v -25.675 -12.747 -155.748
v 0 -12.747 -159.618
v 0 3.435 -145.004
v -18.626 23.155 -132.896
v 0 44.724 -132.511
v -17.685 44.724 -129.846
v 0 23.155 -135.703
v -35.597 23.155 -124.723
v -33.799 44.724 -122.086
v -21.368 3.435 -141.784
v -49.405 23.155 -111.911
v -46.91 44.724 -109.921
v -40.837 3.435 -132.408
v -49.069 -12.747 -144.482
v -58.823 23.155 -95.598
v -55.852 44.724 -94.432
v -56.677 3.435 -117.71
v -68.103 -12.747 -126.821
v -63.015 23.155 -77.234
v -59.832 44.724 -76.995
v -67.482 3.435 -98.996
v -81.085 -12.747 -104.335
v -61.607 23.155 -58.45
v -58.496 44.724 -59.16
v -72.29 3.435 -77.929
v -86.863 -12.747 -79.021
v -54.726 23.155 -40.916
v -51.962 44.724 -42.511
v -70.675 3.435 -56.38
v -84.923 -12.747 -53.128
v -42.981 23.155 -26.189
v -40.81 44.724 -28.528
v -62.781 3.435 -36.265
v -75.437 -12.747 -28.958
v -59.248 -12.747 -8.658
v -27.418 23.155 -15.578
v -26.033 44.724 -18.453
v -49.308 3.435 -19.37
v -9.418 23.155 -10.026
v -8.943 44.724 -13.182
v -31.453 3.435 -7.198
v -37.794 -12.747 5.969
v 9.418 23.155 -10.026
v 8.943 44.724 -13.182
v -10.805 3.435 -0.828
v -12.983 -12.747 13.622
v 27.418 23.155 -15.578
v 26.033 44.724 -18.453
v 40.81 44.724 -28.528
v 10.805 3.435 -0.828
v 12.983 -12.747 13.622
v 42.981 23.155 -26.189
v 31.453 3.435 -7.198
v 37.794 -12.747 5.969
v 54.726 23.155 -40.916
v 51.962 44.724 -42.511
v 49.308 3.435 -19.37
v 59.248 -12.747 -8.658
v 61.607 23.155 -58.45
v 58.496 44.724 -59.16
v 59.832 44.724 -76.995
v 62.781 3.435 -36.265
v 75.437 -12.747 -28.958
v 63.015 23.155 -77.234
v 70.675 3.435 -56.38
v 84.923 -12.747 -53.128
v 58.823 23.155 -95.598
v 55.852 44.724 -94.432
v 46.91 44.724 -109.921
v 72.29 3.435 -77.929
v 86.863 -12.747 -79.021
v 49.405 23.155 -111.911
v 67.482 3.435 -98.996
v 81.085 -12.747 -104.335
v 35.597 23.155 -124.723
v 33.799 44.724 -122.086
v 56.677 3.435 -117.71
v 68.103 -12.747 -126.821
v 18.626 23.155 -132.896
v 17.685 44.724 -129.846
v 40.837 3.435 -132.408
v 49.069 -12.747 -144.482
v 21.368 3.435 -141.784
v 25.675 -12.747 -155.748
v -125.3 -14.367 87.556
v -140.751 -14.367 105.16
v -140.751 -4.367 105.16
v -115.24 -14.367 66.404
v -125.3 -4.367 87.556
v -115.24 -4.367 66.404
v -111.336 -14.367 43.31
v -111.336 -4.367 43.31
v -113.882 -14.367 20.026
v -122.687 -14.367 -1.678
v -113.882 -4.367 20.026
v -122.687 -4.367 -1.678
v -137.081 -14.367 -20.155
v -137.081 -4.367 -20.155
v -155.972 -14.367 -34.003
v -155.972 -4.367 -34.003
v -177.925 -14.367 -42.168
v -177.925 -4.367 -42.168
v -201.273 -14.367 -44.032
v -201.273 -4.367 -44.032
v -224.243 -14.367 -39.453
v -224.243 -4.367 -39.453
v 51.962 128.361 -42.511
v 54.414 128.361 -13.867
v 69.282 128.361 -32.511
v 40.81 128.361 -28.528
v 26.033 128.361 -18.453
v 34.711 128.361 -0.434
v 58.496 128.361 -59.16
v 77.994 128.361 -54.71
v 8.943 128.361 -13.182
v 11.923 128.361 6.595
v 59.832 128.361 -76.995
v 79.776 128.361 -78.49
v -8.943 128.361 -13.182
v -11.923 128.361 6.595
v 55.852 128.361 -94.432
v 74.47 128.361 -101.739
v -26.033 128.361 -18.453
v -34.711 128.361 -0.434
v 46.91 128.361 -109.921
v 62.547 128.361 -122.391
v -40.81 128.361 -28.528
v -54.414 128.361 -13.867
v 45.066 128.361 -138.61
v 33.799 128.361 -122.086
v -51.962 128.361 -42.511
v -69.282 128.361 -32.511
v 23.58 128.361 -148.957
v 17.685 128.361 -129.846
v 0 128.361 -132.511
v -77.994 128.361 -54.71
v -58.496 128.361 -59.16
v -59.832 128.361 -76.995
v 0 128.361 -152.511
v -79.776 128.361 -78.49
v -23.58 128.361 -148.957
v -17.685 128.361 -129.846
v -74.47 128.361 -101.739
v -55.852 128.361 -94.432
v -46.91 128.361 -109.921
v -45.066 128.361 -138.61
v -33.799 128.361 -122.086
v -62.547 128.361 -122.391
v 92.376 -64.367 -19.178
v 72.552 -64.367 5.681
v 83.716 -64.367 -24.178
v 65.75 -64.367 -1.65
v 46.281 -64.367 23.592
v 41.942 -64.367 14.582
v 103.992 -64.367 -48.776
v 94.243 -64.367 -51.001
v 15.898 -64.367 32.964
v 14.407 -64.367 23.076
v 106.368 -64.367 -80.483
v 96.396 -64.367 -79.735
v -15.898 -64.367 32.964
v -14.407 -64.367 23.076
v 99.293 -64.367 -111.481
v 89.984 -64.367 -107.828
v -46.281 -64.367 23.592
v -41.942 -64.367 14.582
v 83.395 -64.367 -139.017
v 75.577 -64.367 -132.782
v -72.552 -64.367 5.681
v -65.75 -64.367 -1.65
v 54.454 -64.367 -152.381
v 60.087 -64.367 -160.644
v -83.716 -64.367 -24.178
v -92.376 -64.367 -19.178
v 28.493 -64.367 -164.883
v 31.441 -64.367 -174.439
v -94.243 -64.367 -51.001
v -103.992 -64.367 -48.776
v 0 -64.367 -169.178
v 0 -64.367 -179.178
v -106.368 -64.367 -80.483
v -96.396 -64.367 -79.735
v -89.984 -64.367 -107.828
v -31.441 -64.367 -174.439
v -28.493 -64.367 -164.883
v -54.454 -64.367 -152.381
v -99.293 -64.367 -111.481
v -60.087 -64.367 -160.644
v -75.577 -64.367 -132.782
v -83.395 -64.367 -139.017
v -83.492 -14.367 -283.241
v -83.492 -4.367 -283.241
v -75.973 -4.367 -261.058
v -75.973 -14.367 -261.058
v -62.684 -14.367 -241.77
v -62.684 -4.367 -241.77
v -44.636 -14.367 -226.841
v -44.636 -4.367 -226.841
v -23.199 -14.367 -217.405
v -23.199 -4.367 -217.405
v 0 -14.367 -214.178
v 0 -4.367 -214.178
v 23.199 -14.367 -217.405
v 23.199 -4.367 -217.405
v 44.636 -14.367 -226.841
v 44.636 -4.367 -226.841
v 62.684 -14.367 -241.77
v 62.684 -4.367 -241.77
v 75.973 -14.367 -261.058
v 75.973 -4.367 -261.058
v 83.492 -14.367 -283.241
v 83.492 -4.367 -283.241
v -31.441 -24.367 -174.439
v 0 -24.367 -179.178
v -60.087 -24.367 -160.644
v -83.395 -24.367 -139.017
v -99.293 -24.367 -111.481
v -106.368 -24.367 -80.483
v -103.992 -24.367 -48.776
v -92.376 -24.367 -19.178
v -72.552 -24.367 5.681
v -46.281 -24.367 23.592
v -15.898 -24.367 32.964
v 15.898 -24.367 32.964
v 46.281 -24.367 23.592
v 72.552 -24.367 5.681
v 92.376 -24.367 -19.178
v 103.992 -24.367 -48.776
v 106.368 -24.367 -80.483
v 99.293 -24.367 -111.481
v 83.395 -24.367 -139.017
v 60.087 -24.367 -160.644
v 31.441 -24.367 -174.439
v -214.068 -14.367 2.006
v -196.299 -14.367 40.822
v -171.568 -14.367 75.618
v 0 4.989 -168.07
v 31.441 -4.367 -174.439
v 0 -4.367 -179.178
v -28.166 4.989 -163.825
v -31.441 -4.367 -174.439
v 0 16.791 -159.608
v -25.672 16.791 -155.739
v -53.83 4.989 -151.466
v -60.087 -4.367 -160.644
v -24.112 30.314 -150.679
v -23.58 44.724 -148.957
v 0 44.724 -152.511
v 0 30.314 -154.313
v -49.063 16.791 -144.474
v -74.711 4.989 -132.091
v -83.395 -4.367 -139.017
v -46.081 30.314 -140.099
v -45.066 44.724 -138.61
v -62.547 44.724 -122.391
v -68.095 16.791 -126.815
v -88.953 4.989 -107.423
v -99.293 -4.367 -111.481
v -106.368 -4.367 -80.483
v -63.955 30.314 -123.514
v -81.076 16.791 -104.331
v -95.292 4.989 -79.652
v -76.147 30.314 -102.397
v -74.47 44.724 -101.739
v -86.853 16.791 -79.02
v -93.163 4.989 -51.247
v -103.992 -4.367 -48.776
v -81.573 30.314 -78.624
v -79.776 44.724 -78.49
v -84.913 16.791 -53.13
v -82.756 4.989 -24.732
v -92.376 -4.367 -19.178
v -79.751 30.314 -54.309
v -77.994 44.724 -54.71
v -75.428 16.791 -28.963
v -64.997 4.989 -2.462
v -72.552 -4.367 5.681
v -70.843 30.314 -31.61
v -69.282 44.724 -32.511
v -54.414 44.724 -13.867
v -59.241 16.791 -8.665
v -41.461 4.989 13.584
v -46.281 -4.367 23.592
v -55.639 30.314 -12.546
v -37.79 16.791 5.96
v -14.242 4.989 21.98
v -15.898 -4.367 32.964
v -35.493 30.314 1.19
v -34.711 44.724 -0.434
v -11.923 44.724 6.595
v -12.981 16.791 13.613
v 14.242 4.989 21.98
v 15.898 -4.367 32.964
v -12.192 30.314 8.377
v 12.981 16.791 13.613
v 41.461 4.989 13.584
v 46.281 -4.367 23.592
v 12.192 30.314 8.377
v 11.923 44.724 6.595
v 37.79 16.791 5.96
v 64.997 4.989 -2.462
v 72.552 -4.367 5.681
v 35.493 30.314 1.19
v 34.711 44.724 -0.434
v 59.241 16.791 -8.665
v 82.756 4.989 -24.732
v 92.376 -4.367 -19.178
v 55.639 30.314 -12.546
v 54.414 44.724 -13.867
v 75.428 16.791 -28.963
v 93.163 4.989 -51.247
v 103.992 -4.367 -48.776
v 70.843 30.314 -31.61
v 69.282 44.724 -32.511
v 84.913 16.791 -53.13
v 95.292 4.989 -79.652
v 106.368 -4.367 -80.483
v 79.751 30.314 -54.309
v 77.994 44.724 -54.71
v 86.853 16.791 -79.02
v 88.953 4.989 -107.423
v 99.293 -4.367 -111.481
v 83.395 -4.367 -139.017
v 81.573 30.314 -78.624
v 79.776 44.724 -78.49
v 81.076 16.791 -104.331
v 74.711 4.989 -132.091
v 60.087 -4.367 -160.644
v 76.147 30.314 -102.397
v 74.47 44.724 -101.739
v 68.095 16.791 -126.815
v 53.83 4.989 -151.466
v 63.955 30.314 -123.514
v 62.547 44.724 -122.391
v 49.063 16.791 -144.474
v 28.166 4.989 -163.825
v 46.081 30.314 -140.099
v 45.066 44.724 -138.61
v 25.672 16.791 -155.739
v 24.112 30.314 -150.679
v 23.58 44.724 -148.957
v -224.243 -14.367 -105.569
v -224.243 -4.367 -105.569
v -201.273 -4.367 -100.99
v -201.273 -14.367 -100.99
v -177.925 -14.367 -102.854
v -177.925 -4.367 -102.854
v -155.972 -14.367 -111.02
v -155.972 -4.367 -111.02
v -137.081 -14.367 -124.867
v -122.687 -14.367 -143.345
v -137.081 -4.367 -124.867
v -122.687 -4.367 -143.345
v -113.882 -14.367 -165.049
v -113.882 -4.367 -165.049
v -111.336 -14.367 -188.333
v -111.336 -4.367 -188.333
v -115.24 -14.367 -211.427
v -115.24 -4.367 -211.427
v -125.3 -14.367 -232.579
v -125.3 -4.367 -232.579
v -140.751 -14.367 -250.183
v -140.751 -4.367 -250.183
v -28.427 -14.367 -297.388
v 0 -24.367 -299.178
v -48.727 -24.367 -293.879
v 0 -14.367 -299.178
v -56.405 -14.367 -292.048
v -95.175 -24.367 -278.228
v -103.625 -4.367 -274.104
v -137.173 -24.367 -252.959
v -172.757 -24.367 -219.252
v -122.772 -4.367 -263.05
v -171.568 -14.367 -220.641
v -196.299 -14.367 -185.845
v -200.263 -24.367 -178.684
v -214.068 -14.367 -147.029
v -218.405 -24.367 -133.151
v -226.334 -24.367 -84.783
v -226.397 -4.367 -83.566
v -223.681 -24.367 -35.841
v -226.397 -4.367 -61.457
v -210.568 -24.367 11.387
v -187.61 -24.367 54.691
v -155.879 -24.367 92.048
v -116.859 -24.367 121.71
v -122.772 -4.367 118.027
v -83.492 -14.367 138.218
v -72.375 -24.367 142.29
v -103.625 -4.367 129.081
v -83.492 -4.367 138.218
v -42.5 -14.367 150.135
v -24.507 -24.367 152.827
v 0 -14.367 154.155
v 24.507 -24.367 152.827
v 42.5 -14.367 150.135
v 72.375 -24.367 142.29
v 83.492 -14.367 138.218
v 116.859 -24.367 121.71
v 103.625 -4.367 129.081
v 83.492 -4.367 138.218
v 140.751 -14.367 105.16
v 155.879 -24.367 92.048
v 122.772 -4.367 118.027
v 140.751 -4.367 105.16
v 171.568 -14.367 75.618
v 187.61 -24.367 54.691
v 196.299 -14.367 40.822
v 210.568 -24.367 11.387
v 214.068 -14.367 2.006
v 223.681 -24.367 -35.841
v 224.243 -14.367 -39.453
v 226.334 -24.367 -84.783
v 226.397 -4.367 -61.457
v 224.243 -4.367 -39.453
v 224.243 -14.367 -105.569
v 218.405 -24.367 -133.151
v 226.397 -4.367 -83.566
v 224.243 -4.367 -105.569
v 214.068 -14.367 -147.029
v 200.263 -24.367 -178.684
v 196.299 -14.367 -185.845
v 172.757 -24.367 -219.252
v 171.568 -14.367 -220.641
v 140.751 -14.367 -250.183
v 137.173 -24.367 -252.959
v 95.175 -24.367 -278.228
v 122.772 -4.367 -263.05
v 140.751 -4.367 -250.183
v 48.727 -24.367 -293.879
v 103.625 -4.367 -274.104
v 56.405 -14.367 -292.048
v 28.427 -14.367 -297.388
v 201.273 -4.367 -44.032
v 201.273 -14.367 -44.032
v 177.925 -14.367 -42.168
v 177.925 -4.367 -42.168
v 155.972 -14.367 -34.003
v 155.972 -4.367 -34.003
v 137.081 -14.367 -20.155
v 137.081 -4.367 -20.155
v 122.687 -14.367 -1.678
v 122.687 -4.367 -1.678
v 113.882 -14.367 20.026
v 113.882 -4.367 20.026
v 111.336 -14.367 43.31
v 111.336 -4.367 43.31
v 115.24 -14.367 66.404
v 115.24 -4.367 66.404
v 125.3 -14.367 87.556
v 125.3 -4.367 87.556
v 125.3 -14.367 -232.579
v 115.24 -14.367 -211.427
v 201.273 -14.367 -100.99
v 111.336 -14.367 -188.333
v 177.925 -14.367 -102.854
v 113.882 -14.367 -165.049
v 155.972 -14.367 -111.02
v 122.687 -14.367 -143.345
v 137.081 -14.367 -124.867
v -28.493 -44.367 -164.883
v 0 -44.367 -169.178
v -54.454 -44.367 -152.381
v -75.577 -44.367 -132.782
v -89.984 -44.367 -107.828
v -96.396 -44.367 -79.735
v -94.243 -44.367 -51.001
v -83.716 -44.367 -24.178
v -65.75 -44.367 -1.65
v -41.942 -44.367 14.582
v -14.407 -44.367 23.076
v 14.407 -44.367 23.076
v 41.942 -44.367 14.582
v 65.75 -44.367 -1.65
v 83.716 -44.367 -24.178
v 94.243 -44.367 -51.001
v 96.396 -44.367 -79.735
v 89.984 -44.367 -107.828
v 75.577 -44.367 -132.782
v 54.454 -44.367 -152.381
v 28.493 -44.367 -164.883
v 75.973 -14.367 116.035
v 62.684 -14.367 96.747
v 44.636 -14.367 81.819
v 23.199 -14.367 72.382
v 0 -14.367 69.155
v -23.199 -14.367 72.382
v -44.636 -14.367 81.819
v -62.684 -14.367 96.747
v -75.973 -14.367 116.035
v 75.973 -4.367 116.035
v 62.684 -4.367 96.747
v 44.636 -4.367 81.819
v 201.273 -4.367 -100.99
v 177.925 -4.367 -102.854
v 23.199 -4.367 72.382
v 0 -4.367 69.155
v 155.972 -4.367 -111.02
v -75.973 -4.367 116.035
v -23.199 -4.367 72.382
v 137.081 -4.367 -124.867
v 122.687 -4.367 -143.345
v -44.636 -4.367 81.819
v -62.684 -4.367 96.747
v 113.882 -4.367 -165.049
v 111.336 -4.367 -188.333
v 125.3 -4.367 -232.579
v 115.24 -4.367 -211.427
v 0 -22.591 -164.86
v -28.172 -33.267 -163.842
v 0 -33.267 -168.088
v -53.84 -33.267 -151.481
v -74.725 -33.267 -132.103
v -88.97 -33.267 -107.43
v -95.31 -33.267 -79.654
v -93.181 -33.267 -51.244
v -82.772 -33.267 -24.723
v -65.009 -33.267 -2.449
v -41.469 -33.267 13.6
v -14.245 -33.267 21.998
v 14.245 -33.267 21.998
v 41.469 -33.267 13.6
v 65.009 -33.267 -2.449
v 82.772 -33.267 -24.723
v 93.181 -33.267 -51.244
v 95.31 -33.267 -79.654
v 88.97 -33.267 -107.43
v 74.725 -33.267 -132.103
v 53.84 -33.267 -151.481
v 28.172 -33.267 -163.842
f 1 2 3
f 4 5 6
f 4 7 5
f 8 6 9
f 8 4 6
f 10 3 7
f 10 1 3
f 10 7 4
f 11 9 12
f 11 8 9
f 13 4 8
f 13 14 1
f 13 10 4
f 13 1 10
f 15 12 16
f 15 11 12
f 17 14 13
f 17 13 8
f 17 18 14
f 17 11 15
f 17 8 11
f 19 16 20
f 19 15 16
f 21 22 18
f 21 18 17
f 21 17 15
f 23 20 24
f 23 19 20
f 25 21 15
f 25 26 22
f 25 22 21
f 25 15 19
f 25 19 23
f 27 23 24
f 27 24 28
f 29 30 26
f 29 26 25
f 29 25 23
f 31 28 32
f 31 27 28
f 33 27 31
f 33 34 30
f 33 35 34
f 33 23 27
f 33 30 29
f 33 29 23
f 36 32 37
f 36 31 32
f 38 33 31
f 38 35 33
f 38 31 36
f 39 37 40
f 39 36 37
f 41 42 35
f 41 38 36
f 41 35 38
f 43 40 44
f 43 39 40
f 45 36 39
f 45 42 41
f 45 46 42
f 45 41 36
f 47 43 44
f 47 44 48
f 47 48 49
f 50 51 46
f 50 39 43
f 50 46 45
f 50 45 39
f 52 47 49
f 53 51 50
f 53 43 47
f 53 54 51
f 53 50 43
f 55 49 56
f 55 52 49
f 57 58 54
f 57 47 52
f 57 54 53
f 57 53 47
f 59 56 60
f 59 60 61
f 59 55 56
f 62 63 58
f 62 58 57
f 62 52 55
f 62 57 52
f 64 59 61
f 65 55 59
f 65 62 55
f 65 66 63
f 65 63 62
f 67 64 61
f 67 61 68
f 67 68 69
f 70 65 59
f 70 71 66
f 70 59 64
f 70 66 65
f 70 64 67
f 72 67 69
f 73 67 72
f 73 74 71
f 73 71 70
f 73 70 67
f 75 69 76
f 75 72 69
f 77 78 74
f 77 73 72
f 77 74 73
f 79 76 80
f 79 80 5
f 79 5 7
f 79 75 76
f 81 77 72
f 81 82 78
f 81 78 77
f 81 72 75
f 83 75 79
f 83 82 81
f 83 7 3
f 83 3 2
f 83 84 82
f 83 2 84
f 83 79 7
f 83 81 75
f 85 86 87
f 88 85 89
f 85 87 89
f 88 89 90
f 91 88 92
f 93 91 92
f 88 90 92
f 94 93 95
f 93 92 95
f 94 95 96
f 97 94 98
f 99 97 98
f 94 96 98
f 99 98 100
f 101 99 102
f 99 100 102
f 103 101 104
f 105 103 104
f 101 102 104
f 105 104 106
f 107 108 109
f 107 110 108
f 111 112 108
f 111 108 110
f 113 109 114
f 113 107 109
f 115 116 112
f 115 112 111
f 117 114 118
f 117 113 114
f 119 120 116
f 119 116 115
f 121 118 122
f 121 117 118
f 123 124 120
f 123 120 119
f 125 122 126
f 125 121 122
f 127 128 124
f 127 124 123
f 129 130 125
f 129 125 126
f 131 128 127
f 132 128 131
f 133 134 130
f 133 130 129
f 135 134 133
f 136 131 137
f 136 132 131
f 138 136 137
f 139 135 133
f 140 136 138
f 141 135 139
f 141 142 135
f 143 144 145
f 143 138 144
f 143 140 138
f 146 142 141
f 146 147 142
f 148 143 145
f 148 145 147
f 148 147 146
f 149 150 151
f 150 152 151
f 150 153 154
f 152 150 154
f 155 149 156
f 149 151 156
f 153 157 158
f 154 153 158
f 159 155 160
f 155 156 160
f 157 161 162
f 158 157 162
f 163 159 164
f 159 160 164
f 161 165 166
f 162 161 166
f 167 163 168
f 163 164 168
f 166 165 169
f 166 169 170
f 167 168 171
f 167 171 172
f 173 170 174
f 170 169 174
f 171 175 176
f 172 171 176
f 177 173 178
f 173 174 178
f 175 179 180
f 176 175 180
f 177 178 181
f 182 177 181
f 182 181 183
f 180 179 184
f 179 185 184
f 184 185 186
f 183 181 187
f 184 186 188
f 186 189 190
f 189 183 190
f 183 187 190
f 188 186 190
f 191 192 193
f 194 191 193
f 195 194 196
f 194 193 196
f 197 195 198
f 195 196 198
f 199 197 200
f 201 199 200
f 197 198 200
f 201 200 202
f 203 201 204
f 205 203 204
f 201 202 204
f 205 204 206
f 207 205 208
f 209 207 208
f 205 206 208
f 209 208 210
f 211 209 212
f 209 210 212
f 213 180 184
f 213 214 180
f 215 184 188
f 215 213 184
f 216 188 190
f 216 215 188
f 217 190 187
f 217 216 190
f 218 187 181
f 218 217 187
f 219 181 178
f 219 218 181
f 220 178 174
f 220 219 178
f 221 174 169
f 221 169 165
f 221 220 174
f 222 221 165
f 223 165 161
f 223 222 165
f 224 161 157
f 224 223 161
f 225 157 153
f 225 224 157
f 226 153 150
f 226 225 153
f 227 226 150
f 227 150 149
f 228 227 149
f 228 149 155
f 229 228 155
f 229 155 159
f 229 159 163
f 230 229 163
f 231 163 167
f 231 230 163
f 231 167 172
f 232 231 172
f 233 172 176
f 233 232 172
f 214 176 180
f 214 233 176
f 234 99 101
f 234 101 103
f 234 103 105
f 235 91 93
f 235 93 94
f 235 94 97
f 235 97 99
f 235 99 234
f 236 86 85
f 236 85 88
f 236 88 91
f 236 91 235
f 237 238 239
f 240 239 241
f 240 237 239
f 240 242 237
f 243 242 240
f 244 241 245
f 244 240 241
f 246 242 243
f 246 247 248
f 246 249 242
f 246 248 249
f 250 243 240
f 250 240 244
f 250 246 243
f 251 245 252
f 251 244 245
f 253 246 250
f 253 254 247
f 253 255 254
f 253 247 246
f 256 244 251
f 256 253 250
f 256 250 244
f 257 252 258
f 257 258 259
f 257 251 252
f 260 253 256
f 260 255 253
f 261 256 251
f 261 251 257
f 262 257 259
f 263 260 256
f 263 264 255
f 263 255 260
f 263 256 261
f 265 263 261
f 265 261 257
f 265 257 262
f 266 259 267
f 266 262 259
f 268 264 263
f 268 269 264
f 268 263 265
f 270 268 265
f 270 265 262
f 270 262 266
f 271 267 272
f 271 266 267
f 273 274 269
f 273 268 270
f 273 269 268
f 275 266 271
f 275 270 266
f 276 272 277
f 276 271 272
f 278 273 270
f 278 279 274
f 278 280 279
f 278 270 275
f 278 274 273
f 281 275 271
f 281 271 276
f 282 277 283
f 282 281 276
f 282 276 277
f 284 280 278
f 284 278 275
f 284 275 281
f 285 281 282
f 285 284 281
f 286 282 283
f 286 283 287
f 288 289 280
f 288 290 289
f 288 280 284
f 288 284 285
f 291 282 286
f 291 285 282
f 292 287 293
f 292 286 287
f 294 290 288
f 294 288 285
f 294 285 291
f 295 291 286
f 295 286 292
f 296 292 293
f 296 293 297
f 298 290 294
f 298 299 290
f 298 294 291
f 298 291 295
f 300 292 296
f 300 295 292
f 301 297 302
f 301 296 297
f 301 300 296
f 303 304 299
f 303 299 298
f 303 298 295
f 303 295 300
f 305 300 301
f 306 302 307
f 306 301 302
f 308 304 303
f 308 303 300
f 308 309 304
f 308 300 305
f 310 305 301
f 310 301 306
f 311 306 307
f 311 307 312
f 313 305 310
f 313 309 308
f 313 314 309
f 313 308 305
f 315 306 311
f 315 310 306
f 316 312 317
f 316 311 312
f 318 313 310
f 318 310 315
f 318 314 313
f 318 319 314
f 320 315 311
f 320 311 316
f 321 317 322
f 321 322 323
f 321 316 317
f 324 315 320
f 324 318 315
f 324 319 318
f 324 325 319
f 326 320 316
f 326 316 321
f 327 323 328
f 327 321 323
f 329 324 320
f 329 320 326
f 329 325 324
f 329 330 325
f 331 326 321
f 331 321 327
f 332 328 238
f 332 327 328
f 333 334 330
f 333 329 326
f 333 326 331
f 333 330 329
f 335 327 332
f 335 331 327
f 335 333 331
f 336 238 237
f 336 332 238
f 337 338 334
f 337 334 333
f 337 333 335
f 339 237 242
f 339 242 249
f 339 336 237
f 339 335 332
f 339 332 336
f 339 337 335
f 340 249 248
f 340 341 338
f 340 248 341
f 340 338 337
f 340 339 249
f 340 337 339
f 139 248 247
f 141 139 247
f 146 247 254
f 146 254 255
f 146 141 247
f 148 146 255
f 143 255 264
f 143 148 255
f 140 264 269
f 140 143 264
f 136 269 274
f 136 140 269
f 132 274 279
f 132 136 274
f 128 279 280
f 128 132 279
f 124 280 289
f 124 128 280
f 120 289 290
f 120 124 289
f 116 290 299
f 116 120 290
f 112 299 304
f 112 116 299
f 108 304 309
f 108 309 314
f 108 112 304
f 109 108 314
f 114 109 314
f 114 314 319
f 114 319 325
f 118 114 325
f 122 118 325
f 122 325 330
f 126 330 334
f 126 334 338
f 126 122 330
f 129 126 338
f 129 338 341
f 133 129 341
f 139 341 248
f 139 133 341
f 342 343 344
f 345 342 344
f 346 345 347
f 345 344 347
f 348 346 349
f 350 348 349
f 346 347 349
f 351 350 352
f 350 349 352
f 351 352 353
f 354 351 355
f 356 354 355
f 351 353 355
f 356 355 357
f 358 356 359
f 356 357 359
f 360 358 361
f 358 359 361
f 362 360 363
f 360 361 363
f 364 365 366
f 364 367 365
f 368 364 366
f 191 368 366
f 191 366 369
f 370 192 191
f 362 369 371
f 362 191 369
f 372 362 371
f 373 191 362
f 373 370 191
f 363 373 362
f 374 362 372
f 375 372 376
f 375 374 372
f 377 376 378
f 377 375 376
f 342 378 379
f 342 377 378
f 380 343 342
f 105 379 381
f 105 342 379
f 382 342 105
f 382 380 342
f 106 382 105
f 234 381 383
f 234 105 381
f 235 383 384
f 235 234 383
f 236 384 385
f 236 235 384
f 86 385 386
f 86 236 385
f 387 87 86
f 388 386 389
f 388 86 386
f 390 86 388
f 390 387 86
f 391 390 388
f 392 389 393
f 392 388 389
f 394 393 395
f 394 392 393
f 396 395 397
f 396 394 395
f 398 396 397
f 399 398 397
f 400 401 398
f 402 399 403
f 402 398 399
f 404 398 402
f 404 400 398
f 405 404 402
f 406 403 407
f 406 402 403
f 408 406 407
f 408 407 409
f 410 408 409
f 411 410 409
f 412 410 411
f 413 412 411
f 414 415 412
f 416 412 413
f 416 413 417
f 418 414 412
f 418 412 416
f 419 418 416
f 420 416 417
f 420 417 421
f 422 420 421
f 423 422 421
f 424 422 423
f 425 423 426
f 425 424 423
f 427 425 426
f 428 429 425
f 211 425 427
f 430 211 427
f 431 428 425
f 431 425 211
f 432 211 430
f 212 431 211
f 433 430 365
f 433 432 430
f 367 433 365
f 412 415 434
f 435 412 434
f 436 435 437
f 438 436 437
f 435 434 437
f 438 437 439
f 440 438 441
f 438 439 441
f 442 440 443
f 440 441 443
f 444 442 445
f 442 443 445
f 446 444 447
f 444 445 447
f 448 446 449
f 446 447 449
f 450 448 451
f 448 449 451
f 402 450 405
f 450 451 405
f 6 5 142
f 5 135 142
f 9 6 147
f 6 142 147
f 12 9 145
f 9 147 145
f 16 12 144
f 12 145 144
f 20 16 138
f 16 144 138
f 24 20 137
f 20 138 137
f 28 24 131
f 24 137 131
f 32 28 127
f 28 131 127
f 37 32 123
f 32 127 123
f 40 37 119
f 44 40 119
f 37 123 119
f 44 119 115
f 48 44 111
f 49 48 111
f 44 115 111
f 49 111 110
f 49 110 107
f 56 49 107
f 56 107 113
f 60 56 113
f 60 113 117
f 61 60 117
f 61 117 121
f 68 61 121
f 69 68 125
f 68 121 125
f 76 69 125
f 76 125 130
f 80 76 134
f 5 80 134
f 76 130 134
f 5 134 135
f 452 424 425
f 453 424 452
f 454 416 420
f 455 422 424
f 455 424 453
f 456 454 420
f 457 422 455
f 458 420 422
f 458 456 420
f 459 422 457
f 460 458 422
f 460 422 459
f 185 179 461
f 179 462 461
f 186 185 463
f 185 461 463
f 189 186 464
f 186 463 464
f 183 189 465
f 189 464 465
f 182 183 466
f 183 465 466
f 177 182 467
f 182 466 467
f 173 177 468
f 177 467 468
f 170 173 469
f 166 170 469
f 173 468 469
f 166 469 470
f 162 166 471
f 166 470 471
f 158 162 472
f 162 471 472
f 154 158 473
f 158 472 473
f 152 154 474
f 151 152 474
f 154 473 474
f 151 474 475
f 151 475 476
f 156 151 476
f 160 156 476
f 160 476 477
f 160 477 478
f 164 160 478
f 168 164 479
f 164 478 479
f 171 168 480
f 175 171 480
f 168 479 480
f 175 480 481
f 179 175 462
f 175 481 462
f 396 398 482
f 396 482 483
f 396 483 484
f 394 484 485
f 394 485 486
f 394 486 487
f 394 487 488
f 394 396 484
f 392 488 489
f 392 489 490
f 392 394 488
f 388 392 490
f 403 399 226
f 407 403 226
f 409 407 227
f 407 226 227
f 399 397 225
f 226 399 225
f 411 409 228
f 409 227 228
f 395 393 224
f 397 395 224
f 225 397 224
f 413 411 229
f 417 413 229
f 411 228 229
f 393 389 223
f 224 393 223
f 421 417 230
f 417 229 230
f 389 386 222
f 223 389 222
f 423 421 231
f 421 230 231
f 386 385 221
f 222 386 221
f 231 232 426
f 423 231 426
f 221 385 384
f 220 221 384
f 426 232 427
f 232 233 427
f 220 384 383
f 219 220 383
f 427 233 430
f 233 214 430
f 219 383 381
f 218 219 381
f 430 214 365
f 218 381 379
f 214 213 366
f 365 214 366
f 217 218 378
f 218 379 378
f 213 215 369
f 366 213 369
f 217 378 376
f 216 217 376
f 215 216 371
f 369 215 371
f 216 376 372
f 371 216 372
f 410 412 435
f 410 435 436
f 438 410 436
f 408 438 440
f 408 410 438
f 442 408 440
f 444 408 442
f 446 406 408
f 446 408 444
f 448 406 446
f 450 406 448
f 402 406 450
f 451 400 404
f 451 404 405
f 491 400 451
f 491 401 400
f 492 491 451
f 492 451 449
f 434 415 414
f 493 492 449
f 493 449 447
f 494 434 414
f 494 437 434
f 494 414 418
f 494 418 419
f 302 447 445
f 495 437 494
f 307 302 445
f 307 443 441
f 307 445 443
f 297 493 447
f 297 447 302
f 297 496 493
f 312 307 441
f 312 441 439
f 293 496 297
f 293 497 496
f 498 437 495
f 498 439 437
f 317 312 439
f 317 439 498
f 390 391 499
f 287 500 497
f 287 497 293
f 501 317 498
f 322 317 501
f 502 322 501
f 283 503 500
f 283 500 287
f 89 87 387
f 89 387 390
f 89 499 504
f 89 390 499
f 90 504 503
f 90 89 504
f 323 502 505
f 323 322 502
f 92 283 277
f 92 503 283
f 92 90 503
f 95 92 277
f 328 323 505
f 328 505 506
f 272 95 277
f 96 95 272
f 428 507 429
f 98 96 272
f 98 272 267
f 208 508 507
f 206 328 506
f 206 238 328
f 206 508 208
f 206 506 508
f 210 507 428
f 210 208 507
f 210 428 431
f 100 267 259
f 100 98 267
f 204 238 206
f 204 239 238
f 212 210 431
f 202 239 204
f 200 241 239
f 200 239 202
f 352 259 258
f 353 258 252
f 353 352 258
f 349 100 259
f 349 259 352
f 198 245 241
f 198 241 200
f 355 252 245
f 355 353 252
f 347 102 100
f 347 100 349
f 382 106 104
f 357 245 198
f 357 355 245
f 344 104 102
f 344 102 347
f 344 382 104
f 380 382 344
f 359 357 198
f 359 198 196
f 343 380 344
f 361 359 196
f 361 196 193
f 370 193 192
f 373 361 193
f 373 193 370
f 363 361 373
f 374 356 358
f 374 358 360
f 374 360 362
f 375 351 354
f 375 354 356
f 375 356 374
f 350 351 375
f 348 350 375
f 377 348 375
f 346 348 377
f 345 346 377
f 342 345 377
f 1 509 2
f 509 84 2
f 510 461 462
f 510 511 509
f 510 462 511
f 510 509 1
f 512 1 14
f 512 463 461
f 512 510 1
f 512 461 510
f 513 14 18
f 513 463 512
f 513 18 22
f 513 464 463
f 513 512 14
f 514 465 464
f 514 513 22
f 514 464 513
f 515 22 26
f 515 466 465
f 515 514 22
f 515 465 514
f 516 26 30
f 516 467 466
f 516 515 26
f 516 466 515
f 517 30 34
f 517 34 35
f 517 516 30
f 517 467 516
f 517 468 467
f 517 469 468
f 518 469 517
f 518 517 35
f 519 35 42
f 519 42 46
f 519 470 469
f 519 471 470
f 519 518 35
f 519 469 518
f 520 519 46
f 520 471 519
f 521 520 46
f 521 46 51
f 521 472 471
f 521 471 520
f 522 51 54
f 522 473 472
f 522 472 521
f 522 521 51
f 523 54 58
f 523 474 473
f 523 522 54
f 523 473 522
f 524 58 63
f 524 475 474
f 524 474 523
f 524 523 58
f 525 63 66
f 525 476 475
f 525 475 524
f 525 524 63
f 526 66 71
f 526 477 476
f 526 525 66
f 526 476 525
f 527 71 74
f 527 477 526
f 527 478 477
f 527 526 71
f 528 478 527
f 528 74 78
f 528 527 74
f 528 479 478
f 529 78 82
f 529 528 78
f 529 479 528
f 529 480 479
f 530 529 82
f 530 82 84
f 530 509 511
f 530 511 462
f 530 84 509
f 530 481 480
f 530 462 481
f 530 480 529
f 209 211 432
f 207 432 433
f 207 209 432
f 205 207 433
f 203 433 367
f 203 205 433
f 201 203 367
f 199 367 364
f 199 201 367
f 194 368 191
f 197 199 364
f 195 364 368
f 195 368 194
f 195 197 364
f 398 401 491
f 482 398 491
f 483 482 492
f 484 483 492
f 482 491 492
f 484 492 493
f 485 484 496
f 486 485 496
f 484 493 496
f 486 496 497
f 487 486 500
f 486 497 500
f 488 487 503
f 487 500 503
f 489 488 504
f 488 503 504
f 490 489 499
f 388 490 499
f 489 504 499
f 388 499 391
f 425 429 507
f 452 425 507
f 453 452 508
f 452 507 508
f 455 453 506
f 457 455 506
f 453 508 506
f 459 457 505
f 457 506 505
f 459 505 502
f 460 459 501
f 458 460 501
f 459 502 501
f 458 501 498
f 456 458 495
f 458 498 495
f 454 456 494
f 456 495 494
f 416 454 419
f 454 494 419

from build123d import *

# Parameters (mm, degrees)
F0_W     = 20
F0_H     = 10
F0_H_2   = 120
F0_W_2   = 83.6363699974
F0_H_3   = 20
F3_DEPTH = 10
F4_DEPTH = 10


with BuildPart() as f1:
    # F0 (on Right) → F1 (revolve)
    with BuildSketch(Plane.YZ):
        with Locations((-54.3666072938, -174.1780357832)):
            Rectangle(F0_W, F0_H)
        with BuildLine():
            ThreePointArc((-12.7470903483, -159.618054612), (-27.8500467267, -166.7357841949), (-44.3666072938, -169.1780357832))
            Line((-44.3666072938, -169.1780357832), (-44.3666072938, -179.1780357832))
            Line((-44.3666072938, -179.1780357832), (-24.3666072938, -179.1780357832))
            ThreePointArc((-24.3666072938, -179.1780357832), (-19.3081292942, -168.9517504843), (-12.7470903483, -159.618054612))
        make_face()
        with Locations((-14.3666072938, -239.1780357832)):
            Rectangle(F0_W, F0_H_2)
        with Locations((86.542492088, -142.5113668702)):
            Rectangle(F0_W_2, F0_H_3)
        with BuildLine():
            ThreePointArc((44.7243070893, -132.5113668702), (12.9527237019, -139.6280506805), (-12.7470903483, -159.618054612))
            ThreePointArc((-12.7470903483, -159.618054612), (-19.3081292942, -168.9517504843), (-24.3666072938, -179.1780357832))
            Line((-24.3666072938, -179.1780357832), (-4.3666072938, -179.1780357832))
            ThreePointArc((-4.3666072938, -179.1780357832), (16.7912213938, -159.6083850702), (44.7243070893, -152.5113668702))
            Line((44.7243070893, -152.5113668702), (44.7243070893, -132.5113668702))
        make_face()
    revolve(axis=Axis((0, 35.6333935665, -72.5113668702), (0, 1, 0)))

    # F2 (on face) → F3 (cut)
    with BuildSketch(Plane(origin=(0, -4.3666072938, 0), x_dir=(-1, 0, 0), z_dir=(0, 1, 0))):
        with BuildLine():
            ThreePointArc((224.2430593698, -105.5693329389), (122.6869341482, -143.3447013267), (140.7505680979, -250.1825698723))
            ThreePointArc((140.7505680979, -250.1825698723), (196.2990934699, -185.8447013267), (224.2430593698, -105.5693329389))
        make_face()
    extrude(amount=-F3_DEPTH, mode=Mode.SUBTRACT)

    # F2 (on face) → F4 (cut)
    with BuildSketch(Plane(origin=(0, -4.3666072938, 0), x_dir=(-1, 0, 0), z_dir=(0, 1, 0))):
        with BuildLine():
            ThreePointArc((-83.4924912719, -283.2405359411), (0, -299.1780357832), (83.4924912719, -283.2405359411))
            ThreePointArc((83.4924912719, -283.2405359411), (0, -214.1780357832), (-83.4924912719, -283.2405359411))
        make_face()
        with BuildLine():
            ThreePointArc((-224.2430593698, -105.5693329389), (-196.2990934699, -185.8447013267), (-140.7505680979, -250.1825698723))
            ThreePointArc((-140.7505680979, -250.1825698723), (-122.6869341482, -143.3447013267), (-224.2430593698, -105.5693329389))
        make_face()
        with BuildLine():
            ThreePointArc((-140.7505680979, 105.159836132), (-196.2990934699, 40.8219675864), (-224.2430593698, -39.4534008014))
            ThreePointArc((-224.2430593698, -39.4534008014), (-122.6869341482, -1.6780324136), (-140.7505680979, 105.159836132))
        make_face()
        with BuildLine():
            ThreePointArc((140.7505680979, 105.159836132), (122.6869341482, -1.6780324136), (224.2430593698, -39.4534008014))
            ThreePointArc((224.2430593698, -39.4534008014), (196.2990934699, 40.8219675864), (140.7505680979, 105.159836132))
        make_face()
        with BuildLine():
            ThreePointArc((83.4924912719, 138.2178022008), (0, 154.1553020429), (-83.4924912719, 138.2178022008))
            ThreePointArc((-83.4924912719, 138.2178022008), (0, 69.1553020429), (83.4924912719, 138.2178022008))
        make_face()
    extrude(amount=-F4_DEPTH, mode=Mode.SUBTRACT)


solid = f1.part
